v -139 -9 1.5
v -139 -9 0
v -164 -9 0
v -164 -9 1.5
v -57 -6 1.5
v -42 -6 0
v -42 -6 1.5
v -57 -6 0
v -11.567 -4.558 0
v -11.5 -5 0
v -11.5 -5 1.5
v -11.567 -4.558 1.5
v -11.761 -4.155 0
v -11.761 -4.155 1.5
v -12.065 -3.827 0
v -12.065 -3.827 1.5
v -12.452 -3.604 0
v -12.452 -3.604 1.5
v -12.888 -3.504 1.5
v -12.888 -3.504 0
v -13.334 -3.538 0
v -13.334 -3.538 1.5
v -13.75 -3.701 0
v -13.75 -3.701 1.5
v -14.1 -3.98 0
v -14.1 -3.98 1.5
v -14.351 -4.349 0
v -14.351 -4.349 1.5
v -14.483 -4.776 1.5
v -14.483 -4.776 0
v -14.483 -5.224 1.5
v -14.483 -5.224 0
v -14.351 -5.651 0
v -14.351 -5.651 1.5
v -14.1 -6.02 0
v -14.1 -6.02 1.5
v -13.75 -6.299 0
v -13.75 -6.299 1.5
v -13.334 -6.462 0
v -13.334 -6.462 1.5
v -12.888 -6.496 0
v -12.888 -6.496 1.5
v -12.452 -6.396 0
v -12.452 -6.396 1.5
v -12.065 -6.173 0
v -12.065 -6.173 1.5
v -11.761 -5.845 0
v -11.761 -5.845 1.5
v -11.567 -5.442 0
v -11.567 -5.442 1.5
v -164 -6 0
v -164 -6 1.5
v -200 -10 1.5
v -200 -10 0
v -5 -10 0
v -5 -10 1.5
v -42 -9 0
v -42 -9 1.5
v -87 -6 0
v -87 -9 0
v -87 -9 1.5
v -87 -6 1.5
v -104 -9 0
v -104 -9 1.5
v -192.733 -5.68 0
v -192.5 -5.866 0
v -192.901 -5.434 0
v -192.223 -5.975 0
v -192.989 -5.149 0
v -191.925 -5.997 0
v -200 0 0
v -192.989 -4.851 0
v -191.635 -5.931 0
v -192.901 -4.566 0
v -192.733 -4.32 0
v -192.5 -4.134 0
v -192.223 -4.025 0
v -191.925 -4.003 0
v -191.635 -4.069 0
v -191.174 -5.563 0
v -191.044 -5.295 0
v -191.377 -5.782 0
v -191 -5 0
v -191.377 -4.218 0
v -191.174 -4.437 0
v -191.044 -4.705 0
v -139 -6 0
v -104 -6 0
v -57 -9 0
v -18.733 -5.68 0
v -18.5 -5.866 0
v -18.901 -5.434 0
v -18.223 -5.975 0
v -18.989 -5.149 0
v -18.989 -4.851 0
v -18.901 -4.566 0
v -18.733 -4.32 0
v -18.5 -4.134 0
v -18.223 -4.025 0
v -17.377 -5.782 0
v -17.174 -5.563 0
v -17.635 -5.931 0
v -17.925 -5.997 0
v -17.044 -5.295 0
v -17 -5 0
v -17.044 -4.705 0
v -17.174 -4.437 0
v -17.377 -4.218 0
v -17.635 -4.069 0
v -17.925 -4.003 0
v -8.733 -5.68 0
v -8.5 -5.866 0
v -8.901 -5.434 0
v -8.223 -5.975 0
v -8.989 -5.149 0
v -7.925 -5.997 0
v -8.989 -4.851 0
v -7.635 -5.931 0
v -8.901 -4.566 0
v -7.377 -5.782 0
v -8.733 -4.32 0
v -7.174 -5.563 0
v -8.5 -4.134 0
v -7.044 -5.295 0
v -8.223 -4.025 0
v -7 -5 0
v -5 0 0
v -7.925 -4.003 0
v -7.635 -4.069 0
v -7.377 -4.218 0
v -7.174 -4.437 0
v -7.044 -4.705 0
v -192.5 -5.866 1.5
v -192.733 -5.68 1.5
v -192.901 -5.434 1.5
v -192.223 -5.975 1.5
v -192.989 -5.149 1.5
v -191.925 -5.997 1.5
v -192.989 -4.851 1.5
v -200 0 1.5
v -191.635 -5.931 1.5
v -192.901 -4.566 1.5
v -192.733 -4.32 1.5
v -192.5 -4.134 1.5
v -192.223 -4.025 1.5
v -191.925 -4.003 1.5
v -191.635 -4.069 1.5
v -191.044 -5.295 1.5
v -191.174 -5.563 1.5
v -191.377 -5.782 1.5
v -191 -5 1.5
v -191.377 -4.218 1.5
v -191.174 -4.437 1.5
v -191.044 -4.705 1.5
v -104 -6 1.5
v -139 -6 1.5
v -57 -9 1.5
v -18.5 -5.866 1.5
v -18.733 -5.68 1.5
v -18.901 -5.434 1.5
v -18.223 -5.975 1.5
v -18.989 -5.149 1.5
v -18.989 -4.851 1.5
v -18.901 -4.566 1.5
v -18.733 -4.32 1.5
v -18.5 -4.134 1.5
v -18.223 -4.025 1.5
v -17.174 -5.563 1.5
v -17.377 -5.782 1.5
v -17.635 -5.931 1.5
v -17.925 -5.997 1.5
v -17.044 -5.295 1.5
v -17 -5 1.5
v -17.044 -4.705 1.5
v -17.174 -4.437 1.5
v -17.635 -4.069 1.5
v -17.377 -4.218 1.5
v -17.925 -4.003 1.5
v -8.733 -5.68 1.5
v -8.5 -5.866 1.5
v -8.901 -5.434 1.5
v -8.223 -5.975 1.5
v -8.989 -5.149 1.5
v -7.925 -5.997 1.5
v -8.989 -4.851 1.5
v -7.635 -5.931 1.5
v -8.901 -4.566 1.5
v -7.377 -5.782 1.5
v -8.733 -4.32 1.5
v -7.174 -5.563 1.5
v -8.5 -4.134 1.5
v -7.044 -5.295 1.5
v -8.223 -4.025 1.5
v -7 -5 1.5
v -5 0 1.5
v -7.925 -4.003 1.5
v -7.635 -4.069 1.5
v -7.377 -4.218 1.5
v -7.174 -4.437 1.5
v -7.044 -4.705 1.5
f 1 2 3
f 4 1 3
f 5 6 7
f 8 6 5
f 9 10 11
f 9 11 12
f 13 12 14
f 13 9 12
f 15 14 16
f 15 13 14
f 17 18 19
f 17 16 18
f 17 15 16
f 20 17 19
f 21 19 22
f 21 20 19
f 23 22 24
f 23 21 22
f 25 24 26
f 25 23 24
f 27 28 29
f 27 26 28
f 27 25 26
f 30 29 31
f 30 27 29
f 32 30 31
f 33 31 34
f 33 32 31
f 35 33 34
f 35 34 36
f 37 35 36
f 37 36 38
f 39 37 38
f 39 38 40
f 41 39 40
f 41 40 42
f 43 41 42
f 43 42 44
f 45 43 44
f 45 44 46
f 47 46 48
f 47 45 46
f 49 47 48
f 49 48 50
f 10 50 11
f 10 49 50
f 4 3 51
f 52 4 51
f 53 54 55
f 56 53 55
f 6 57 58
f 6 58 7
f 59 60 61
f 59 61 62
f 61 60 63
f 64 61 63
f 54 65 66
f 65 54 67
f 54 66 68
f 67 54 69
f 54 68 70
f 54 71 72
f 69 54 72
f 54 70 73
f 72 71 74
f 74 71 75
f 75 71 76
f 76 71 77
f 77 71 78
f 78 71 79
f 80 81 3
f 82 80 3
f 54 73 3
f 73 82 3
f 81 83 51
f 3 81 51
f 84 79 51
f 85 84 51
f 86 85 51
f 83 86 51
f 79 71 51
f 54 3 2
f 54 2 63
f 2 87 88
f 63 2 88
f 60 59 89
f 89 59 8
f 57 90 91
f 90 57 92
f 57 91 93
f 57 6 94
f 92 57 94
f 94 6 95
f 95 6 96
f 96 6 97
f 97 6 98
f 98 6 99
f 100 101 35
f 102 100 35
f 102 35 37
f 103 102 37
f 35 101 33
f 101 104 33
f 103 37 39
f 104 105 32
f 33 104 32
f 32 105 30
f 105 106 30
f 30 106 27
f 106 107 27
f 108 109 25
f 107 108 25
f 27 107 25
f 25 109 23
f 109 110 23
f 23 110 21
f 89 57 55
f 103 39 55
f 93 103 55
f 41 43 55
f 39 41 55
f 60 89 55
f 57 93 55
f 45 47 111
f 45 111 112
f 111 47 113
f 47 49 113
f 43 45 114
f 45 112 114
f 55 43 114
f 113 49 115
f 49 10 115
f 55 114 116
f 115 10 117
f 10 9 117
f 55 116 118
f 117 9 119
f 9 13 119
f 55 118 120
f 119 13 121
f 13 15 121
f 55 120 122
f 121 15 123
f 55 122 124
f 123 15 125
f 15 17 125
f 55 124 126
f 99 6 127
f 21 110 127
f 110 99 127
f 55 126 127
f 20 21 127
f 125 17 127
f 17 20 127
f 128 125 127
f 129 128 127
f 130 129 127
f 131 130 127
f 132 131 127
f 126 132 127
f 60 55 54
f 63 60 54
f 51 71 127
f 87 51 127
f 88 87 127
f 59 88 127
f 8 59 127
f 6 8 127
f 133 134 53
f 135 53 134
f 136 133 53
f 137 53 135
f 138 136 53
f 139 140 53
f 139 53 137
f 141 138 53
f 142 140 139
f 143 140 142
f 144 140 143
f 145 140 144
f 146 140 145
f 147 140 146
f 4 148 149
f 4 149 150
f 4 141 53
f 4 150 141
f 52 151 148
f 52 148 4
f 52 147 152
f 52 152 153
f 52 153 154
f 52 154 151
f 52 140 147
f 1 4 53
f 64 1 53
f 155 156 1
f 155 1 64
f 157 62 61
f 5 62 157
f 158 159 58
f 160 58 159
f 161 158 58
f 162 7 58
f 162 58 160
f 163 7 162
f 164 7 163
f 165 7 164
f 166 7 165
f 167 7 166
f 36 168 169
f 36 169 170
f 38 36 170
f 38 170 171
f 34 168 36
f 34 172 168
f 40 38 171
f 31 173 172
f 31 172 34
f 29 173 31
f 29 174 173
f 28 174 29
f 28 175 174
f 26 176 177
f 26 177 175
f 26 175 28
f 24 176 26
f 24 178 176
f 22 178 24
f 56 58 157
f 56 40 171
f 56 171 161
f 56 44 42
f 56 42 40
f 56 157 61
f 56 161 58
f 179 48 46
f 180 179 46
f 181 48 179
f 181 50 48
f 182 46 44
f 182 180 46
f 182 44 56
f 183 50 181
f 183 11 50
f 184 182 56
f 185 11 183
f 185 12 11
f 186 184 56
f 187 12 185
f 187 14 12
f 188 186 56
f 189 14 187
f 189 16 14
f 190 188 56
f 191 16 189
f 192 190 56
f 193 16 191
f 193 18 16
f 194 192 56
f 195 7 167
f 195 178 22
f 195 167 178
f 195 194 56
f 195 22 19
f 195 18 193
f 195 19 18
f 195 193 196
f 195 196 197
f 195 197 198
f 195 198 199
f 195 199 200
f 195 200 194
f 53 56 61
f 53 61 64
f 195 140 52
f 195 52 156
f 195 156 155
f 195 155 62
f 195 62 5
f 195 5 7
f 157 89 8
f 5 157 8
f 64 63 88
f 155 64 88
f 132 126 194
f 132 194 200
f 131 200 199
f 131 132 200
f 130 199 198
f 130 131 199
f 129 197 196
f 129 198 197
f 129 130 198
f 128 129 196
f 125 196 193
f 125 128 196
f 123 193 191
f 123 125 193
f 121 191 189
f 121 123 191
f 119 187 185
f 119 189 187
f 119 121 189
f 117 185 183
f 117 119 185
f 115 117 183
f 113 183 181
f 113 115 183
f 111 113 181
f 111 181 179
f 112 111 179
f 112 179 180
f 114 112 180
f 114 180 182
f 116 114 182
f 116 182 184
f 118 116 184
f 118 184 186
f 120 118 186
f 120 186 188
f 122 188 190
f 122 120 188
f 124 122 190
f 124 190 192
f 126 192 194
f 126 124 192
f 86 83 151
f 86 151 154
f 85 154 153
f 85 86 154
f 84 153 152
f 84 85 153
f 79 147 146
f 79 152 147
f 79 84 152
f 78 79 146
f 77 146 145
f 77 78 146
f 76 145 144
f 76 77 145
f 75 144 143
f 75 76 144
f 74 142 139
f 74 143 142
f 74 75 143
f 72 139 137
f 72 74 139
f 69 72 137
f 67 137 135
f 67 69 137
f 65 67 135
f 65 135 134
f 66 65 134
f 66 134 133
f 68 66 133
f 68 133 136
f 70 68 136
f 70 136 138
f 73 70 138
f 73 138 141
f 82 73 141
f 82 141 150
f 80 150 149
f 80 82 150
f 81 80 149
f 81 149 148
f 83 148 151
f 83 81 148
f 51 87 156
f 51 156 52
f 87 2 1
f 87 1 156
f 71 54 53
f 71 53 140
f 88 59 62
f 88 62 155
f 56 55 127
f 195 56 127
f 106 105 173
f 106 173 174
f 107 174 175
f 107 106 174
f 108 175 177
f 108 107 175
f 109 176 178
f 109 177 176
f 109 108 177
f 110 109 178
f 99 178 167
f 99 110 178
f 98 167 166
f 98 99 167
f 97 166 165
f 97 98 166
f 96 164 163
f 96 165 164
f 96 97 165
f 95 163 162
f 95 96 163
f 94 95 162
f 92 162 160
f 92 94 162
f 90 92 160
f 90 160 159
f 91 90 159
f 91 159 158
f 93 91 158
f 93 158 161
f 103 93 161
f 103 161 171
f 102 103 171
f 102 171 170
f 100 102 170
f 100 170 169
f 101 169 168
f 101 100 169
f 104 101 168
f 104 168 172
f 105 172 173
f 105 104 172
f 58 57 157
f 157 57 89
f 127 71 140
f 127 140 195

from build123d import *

# Parameters (mm, degrees)
SKETCH_1_W               = 195
SKETCH_1_H               = 10
EXTRUDE_1_DEPTH          = 1.5
CUT_EXTRUDE_1_DEPTH      = 12
CUT_EXTRUDE_1_DEPTH_BACK = 15
CUT_EXTRUDE_2_DEPTH      = 32
CUT_EXTRUDE_2_DEPTH_BACK = 31
SKETCH_3_R               = 1.5
SKETCH_3_R_2             = 1
SKETCH_4_W               = 15
SKETCH_4_H               = 3
SKETCH_4_W_2             = 17
SKETCH_4_W_3             = 25
CUT_EXTRUDE_3_DEPTH      = 10


with BuildPart() as part:
    # 草图1 → 凸台-拉伸1 (new body)
    with BuildSketch(Plane.XY):
        with Locations((-102.5, -5)):
            Rectangle(SKETCH_1_W, SKETCH_1_H)
    extrude(amount=EXTRUDE_1_DEPTH)

    # 草图2 → 切除-拉伸1 (cut, two sides: drawn at the far end of the back side and taken through both)
    with BuildSketch(Plane.XY.offset(1.5).offset(-CUT_EXTRUDE_1_DEPTH_BACK)):
        with BuildLine():
            ThreePointArc((-193, -5), (-192, -6), (-191, -5))
            ThreePointArc((-191, -5), (-192, -4), (-193, -5))
        make_face()
    extrude(amount=CUT_EXTRUDE_1_DEPTH + CUT_EXTRUDE_1_DEPTH_BACK, mode=Mode.SUBTRACT)

    # 草图3 → 切除-拉伸2 (cut, two sides: drawn at the far end of the back side and taken through both)
    with BuildSketch(Plane.XY.offset(1.5).offset(-CUT_EXTRUDE_2_DEPTH_BACK)):
        with Locations((-13, -5)):
            Circle(SKETCH_3_R)
        with Locations((-8, -5)):
            Circle(SKETCH_3_R_2)
        with Locations((-18, -5)):
            Circle(SKETCH_3_R_2)
    extrude(amount=CUT_EXTRUDE_2_DEPTH + CUT_EXTRUDE_2_DEPTH_BACK, mode=Mode.SUBTRACT)

    # 草图4 → 切除-拉伸3 (cut)
    with BuildSketch(Plane(origin=(0, 0, 0), x_dir=(-1, 0, 0), z_dir=(0, 0, -1))):
        with Locations((49.5, -7.5)):
            Rectangle(SKETCH_4_W, SKETCH_4_H)
        with Locations((95.5, -7.5)):
            Rectangle(SKETCH_4_W_2, SKETCH_4_H)
        with Locations((151.5, -7.5)):
            Rectangle(SKETCH_4_W_3, SKETCH_4_H)
    extrude(amount=-CUT_EXTRUDE_3_DEPTH, mode=Mode.SUBTRACT)


solid = part.part
